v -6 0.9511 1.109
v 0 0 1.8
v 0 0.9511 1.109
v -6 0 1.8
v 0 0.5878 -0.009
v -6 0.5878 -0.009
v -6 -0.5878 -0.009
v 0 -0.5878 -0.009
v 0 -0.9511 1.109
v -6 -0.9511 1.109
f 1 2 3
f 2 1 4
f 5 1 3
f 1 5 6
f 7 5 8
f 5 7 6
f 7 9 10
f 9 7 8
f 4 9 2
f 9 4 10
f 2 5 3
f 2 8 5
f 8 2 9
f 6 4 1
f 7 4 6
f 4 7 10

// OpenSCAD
translate([0,0,.8]) {
    rotate([0,-90,0]) {
        cylinder(h=6, r=1);
    }
}
